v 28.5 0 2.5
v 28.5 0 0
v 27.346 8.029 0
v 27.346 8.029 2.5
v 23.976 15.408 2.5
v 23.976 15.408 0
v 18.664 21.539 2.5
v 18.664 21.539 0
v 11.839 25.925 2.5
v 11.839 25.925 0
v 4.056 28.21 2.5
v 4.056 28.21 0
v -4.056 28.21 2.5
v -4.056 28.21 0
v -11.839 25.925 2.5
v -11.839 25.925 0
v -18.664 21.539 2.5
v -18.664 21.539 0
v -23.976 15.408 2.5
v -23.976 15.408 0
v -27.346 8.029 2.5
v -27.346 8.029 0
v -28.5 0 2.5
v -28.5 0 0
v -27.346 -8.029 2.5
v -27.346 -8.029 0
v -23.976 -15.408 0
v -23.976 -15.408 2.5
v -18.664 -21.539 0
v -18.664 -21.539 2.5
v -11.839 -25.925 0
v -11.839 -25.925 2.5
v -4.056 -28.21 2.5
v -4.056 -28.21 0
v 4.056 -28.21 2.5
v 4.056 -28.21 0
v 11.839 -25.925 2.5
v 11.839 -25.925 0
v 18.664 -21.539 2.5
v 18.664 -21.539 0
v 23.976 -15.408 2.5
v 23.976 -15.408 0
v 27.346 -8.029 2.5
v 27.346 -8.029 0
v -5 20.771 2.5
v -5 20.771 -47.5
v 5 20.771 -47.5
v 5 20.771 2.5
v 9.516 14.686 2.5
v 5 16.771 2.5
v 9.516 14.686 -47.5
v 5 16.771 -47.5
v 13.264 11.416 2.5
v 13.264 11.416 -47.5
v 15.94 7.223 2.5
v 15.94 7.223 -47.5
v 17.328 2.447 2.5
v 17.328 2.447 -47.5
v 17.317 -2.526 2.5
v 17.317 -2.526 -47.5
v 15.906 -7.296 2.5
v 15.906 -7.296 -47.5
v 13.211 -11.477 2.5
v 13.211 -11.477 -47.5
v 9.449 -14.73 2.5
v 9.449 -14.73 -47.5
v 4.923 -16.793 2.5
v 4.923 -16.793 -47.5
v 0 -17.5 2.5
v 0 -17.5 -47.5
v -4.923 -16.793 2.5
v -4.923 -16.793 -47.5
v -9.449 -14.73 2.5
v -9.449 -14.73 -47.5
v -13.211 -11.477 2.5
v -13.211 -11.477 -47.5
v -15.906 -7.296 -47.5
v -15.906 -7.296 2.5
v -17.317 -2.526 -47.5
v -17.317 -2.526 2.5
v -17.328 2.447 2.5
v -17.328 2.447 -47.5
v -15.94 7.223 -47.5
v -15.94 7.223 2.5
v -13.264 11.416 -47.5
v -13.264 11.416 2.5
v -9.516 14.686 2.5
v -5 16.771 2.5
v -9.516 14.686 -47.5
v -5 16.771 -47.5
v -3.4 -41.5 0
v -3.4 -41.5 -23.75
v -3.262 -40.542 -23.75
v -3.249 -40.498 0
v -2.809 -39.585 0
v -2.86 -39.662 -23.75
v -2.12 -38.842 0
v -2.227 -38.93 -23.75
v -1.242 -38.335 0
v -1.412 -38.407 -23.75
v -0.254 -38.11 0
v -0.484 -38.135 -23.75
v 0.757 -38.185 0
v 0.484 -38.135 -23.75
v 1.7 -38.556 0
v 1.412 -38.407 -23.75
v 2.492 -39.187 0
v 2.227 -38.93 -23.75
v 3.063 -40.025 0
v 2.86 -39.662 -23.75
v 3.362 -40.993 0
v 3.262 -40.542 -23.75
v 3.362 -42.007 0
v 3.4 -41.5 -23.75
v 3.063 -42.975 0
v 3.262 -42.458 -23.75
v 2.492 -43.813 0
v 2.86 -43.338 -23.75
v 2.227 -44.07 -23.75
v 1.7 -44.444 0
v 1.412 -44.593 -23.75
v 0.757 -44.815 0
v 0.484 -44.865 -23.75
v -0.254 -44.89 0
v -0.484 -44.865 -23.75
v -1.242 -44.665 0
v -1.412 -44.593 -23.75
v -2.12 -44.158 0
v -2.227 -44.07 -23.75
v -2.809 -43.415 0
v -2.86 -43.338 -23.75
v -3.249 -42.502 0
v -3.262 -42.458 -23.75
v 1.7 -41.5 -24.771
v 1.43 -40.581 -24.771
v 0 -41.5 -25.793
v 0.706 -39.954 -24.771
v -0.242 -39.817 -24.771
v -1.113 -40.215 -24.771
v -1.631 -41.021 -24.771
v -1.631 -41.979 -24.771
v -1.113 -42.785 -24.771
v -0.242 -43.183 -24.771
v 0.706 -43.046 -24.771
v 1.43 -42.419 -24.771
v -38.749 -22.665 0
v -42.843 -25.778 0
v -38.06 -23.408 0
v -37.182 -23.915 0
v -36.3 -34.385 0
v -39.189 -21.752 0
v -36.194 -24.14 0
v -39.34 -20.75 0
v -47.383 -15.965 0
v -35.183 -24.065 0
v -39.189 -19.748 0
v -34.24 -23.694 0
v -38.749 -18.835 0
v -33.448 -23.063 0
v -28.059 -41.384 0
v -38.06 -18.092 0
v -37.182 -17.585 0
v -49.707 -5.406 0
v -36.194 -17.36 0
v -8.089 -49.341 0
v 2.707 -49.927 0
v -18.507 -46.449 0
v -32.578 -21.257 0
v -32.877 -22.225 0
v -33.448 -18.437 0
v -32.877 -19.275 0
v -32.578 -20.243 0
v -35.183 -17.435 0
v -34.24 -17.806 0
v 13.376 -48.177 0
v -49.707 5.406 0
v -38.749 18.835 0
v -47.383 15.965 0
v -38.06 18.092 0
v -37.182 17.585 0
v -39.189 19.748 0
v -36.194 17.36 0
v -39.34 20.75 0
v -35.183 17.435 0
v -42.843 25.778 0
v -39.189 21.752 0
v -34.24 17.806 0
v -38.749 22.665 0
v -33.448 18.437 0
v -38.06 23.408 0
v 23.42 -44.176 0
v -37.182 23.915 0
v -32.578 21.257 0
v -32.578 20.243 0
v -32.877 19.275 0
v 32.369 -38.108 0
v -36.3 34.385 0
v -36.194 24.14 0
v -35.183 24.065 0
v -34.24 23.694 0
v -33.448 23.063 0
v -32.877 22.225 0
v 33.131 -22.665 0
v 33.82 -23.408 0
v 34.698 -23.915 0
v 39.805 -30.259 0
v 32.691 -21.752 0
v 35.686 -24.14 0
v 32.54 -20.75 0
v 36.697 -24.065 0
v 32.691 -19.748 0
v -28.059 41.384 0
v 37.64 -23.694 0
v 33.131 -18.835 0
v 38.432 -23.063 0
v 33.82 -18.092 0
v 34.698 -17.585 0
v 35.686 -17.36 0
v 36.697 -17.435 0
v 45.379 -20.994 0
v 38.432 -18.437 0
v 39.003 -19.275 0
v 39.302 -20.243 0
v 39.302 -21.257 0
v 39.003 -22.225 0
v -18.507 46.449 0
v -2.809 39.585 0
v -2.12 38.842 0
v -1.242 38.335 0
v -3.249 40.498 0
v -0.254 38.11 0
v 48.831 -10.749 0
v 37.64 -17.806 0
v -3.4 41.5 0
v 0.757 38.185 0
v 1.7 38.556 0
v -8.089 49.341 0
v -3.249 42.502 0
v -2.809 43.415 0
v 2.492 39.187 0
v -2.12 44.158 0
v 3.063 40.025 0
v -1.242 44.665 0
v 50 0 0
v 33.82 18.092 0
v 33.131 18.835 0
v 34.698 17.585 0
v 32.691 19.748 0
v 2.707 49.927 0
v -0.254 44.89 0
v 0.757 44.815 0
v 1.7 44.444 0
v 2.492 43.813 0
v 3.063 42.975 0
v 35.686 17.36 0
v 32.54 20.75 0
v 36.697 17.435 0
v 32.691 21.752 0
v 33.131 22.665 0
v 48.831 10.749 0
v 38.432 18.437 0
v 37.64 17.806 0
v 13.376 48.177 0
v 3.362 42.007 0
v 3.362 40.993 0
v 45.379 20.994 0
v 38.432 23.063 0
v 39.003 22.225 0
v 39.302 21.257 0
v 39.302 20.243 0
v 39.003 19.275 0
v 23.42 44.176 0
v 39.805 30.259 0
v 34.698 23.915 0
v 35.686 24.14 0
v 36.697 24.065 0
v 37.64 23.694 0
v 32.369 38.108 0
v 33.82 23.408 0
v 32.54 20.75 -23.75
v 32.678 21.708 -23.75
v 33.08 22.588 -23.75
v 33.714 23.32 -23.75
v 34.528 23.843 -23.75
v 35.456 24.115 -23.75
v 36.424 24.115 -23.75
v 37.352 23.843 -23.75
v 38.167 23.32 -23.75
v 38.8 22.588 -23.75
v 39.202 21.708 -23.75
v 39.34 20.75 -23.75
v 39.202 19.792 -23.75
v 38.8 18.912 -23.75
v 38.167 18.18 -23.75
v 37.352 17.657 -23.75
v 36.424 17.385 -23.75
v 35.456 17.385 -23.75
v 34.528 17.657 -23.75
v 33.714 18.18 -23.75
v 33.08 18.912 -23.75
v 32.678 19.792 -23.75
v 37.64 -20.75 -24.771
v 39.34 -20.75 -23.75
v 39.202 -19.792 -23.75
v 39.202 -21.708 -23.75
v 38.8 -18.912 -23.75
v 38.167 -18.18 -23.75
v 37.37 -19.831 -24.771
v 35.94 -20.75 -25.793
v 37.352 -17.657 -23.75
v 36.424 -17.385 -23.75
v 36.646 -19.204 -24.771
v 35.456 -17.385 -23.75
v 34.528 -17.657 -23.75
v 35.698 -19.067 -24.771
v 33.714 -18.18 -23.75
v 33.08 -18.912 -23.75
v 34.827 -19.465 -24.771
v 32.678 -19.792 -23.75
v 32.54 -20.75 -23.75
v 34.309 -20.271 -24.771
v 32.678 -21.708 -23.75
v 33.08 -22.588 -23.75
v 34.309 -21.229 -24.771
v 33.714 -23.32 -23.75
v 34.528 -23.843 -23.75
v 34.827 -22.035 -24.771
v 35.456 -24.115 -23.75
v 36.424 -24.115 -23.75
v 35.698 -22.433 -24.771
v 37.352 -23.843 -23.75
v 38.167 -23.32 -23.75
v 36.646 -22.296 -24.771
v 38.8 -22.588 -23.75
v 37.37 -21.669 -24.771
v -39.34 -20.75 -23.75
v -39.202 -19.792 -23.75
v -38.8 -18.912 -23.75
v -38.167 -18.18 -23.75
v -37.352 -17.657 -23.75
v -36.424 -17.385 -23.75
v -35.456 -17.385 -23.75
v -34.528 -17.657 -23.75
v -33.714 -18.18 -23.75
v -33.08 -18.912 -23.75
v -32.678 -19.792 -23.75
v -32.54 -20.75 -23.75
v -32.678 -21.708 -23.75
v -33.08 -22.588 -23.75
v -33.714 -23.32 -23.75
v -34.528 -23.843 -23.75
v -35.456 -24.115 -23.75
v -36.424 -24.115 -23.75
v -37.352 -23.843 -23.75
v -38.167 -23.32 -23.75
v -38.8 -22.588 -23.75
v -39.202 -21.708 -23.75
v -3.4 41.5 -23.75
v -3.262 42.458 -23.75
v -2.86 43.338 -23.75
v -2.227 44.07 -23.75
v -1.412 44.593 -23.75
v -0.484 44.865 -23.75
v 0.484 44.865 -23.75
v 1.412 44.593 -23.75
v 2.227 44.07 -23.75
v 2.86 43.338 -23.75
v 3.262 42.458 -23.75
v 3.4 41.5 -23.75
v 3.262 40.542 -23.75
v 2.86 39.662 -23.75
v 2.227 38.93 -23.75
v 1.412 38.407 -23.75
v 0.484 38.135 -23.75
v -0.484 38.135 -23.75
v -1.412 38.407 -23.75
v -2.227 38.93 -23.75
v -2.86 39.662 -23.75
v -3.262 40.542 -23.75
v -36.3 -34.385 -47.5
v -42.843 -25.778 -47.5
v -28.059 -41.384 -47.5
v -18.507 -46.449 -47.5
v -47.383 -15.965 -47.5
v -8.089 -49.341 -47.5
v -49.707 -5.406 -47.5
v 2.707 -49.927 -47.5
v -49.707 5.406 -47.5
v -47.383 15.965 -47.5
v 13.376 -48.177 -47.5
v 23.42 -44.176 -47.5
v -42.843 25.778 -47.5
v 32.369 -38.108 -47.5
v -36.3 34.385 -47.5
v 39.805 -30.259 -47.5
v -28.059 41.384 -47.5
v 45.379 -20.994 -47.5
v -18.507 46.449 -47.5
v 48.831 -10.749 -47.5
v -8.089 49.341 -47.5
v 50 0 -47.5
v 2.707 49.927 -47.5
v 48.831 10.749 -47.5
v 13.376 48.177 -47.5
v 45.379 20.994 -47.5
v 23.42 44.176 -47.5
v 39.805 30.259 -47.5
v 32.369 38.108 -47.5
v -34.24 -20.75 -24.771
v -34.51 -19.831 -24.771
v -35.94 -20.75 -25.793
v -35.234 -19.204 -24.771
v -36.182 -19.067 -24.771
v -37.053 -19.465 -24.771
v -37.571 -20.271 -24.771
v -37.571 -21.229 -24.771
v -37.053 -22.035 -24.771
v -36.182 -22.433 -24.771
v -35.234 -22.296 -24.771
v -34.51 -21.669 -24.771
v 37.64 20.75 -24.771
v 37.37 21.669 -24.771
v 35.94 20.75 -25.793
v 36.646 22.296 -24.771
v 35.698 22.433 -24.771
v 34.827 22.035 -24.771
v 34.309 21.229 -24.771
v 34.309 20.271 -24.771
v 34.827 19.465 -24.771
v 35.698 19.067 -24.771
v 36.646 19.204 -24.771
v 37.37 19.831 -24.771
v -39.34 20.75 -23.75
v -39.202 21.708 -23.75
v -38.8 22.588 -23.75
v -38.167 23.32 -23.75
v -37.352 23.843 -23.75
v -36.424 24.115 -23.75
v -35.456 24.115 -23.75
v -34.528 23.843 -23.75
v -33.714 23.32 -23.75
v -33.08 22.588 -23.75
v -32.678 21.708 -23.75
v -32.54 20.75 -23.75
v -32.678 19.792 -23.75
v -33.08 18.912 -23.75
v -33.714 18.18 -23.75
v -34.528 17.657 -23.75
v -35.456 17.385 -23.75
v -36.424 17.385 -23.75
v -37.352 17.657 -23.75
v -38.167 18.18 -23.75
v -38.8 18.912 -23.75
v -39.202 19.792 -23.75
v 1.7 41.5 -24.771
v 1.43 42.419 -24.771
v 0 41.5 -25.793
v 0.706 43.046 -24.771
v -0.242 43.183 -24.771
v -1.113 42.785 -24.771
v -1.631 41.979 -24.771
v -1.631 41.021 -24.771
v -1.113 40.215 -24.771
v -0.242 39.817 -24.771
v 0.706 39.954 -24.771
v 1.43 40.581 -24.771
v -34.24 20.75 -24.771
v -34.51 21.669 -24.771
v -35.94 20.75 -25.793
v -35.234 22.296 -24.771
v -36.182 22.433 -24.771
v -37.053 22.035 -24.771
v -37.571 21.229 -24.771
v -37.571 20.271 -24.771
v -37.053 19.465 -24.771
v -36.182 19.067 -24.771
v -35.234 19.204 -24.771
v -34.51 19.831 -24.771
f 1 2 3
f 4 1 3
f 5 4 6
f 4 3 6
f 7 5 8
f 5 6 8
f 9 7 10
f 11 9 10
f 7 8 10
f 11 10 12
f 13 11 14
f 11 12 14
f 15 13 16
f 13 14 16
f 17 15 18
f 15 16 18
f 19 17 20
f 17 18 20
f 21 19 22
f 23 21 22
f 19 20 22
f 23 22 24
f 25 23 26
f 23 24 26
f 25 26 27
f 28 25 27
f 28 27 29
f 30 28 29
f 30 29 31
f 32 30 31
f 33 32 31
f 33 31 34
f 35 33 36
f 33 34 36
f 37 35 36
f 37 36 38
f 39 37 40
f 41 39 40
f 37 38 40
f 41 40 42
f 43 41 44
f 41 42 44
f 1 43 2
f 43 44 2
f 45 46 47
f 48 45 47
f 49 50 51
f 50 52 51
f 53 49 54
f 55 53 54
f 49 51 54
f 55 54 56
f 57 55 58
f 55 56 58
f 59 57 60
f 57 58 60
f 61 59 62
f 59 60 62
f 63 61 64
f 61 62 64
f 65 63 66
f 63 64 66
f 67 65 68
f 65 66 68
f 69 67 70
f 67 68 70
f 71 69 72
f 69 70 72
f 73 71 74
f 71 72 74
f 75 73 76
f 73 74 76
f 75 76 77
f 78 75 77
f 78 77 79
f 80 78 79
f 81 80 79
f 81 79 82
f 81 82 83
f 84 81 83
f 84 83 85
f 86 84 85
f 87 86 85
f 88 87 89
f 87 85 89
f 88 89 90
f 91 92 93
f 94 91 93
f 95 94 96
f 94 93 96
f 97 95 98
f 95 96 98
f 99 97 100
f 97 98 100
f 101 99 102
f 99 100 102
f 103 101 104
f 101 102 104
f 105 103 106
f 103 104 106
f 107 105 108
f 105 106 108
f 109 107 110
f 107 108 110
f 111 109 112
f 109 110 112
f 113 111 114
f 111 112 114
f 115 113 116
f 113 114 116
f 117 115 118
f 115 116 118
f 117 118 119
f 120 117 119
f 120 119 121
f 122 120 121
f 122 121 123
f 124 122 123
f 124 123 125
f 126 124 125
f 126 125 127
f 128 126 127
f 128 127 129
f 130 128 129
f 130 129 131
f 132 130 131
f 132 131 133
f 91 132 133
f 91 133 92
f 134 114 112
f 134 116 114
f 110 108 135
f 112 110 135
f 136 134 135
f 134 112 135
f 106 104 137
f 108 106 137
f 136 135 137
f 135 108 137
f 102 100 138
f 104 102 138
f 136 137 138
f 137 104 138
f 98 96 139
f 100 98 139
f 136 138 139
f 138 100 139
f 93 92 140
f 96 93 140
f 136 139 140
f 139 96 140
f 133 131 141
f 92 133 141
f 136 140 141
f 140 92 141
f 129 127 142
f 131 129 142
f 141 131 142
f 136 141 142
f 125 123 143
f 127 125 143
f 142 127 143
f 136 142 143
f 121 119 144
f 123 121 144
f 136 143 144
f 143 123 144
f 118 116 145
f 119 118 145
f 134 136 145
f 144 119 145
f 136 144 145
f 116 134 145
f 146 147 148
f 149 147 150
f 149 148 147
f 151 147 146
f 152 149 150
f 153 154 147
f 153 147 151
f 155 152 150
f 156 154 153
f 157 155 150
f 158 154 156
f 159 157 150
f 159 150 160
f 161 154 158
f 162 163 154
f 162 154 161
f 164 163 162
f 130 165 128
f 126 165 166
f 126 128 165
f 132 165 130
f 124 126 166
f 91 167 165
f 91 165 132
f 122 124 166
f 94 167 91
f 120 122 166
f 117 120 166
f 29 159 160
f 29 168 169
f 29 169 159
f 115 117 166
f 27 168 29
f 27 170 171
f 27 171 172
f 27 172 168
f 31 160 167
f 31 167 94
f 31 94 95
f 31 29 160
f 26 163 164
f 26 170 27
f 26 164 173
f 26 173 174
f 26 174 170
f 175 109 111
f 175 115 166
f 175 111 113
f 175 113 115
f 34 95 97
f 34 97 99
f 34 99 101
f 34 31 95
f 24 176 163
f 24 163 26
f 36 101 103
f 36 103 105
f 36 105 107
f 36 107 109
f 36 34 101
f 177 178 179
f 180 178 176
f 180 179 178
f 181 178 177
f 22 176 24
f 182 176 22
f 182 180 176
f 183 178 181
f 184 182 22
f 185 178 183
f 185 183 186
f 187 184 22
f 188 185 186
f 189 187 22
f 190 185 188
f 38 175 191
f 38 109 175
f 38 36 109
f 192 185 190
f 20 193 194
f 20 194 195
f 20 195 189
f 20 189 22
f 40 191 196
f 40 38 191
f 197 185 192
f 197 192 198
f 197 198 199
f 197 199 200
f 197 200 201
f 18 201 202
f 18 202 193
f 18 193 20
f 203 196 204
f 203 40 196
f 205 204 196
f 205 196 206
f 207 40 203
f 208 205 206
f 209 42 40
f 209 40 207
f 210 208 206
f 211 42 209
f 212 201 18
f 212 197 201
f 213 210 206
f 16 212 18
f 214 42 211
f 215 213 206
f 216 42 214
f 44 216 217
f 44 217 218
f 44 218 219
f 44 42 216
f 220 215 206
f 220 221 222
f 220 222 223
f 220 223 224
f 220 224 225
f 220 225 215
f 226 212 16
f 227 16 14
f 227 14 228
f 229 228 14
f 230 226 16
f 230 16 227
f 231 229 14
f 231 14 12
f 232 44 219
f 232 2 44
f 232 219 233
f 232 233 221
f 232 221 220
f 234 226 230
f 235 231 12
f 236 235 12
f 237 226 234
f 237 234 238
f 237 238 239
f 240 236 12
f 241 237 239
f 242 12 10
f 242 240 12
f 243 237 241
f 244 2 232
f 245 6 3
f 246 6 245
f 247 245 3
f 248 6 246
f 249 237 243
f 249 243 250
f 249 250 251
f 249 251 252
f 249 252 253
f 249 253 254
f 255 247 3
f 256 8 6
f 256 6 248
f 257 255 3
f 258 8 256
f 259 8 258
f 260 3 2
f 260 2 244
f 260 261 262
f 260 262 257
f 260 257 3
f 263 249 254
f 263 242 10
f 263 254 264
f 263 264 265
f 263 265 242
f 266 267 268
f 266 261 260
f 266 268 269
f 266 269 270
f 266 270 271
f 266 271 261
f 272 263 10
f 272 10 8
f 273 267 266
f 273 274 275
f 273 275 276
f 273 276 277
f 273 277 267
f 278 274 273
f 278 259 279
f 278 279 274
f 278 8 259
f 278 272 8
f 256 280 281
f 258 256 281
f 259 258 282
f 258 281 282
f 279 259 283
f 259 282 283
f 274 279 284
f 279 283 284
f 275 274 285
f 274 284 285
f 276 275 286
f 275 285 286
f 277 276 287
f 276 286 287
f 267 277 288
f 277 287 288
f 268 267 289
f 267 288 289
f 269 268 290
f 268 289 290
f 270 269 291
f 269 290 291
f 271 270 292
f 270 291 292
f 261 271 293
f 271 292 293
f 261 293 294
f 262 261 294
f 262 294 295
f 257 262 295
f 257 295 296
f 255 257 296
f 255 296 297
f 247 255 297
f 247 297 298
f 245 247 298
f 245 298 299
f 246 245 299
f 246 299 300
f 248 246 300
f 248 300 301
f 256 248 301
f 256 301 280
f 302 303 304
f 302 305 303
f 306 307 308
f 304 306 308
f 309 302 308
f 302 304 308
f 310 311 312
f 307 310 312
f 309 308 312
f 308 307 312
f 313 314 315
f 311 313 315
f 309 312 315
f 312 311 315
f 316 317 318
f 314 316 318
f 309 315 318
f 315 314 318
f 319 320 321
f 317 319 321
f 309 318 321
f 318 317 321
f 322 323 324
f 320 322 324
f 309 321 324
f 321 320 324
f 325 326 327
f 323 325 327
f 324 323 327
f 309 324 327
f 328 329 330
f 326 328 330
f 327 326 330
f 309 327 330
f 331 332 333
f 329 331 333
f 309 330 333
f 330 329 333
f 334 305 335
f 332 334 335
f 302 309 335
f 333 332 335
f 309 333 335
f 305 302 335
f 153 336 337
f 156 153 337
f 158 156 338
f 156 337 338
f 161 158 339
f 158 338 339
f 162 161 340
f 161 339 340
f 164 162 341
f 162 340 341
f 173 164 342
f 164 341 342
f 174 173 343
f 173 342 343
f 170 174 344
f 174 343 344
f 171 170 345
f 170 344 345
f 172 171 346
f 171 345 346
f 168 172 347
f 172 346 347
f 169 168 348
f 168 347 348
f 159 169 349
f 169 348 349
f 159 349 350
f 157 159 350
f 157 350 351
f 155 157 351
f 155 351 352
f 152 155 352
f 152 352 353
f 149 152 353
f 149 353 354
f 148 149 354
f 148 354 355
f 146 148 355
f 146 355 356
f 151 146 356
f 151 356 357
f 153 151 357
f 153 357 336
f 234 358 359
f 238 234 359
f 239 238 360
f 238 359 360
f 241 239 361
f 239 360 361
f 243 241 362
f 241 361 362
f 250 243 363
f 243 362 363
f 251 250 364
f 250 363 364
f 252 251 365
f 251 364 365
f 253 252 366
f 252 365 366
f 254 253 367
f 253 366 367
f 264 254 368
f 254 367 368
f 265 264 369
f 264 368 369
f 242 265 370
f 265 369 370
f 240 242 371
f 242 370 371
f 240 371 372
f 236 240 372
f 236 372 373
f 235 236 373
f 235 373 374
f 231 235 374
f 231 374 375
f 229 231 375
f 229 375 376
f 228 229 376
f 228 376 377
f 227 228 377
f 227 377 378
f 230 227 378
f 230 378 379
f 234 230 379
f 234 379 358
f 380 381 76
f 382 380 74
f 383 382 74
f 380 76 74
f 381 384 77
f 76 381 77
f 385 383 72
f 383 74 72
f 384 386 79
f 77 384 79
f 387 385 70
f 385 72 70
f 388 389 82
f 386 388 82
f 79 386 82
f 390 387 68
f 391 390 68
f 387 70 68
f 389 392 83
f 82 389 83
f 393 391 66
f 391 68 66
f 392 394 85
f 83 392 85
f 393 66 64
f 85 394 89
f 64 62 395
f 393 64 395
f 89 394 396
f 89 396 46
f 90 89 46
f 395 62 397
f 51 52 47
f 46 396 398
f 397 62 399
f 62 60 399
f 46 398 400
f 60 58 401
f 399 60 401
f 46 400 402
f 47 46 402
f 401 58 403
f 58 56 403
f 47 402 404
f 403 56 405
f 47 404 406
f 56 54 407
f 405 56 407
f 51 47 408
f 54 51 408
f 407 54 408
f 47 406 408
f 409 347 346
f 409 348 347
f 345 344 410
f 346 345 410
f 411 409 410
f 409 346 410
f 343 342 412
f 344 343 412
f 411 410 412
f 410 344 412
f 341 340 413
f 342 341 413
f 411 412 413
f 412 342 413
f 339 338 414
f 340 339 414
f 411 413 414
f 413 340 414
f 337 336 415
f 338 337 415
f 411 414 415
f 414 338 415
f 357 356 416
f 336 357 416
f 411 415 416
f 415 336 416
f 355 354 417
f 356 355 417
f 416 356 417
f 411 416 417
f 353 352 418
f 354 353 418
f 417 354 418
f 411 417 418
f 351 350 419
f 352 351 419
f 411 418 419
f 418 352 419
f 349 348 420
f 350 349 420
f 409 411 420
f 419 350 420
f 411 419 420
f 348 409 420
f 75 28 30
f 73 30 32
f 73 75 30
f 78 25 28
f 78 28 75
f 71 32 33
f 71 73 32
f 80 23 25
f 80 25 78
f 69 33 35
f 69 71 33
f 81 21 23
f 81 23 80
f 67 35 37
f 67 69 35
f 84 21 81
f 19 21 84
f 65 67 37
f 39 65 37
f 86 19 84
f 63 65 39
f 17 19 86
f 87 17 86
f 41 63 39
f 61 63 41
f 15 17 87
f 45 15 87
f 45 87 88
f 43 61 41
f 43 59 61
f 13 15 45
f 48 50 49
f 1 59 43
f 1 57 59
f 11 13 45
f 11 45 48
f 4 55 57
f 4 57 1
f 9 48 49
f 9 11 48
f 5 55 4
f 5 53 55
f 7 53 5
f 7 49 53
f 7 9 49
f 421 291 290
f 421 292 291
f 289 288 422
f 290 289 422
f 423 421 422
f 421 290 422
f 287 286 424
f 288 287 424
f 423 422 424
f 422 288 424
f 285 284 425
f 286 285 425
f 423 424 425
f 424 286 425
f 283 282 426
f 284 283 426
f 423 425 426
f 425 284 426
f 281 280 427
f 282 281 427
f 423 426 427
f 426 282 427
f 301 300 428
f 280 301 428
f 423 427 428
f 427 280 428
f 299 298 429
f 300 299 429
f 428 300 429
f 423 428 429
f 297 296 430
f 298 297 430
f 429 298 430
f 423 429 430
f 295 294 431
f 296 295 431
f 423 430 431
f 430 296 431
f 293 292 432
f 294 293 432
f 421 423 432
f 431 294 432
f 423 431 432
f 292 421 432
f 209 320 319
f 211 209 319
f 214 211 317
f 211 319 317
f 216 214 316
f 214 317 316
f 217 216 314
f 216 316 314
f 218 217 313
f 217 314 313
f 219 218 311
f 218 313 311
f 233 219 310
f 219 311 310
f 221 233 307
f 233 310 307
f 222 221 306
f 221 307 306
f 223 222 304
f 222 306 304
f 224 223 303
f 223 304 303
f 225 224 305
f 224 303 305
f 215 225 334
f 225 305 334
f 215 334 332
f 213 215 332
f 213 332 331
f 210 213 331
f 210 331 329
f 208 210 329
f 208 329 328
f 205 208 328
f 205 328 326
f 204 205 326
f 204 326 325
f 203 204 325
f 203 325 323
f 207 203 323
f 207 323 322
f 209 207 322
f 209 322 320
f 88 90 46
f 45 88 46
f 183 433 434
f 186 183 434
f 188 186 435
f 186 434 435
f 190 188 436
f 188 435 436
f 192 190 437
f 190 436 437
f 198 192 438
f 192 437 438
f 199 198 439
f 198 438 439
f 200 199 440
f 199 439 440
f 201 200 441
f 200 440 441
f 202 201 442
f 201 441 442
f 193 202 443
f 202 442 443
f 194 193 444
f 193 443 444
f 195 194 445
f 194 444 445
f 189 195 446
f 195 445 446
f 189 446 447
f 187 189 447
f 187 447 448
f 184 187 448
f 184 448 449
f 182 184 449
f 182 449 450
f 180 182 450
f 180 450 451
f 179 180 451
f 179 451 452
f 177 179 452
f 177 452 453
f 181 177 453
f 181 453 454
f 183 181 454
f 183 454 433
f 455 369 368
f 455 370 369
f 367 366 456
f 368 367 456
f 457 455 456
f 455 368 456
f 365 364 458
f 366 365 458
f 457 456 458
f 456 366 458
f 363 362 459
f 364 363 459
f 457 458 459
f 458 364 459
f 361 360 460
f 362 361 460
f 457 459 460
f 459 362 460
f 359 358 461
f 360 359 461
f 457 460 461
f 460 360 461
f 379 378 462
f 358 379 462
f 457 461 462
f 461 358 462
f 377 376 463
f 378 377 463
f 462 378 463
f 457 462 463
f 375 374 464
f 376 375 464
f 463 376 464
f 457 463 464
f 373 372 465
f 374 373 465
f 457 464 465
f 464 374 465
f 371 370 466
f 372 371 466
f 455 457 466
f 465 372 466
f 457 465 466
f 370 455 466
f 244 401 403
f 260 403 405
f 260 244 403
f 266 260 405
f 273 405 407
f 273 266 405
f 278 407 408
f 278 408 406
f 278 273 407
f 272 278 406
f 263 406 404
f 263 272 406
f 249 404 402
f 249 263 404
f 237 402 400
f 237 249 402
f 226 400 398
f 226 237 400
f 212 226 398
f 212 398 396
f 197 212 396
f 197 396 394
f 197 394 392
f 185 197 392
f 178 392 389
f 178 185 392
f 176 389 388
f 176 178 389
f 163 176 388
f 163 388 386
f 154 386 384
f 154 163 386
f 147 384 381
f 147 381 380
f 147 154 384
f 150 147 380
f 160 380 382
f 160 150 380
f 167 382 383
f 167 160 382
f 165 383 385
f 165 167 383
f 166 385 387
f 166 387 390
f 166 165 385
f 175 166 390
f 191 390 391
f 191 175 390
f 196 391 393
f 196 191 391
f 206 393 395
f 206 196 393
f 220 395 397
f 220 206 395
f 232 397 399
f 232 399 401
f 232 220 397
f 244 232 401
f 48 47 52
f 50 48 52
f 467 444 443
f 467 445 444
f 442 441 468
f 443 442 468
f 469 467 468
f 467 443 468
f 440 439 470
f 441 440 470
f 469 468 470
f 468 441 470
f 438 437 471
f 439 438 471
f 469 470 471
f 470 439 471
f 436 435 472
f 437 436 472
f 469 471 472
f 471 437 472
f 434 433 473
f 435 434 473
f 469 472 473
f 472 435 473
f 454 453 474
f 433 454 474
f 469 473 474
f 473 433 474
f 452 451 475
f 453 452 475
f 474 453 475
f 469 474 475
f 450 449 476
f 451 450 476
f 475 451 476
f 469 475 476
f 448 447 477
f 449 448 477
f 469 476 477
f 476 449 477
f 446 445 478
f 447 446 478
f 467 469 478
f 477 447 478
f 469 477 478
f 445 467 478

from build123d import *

# Parameters (mm, degrees)
F0_R           = 50
F0_R_2         = 28.5
F1_DEPTH       = 47.5
F2_DEPTH       = 47.5
F3_D           = 6.8
F3_DEPTH       = 23.75
F3_CBORE_D     = 6.8
F3_CBORE_DEPTH = 1
F3_TIP         = 2.0429261047
F4_DEPTH       = 2.5


with BuildPart() as f1:
    # F0 (on Top) → F1 (new body)
    with BuildSketch(Plane.XY):
        Circle(F0_R)
        with BuildLine():
            ThreePointArc((37.7707857076, 17.193537944), (40.5569821786, 8.7966582614), (41.5, 0))
            ThreePointArc((41.5, 0), (40.5569821786, -8.7966582614), (37.7707857076, -17.193537944))
            ThreePointArc((37.7707857076, -17.193537944), (39.3549426741, -18.6670844715), (39.9400542571, -20.75))
            ThreePointArc((39.9400542571, -20.75), (37.8559766131, -24.2613019702), (33.7754334942, -24.1136909717))
            ThreePointArc((33.7754334942, -24.1136909717), (20.75, -35.9400542571), (3.9953522134, -41.3072289157))
            ThreePointArc((3.9953522134, -41.3072289157), (3.9988378845, -41.4035864469), (4, -41.5))
            ThreePointArc((4, -41.5), (-0.0964135531, -45.4988378845), (-3.9953522134, -41.3072289157))
            ThreePointArc((-3.9953522134, -41.3072289157), (-20.75, -35.9400542571), (-33.7754334942, -24.1136909717))
            ThreePointArc((-33.7754334942, -24.1136909717), (-39.4041558722, -22.75), (-37.7707857076, -17.193537944))
            ThreePointArc((-37.7707857076, -17.193537944), (-41.5, 0), (-37.7707857076, 17.193537944))
            ThreePointArc((-37.7707857076, 17.193537944), (-39.4041558722, 22.75), (-33.7754334942, 24.1136909717))
            ThreePointArc((-33.7754334942, 24.1136909717), (-20.75, 35.9400542571), (-3.9953522134, 41.3072289157))
            ThreePointArc((-3.9953522134, 41.3072289157), (-0.0964135531, 45.4988378845), (4, 41.5))
            ThreePointArc((4, 41.5), (3.9988378845, 41.4035864469), (3.9953522134, 41.3072289157))
            ThreePointArc((3.9953522134, 41.3072289157), (20.75, 35.9400542571), (33.7754334942, 24.1136909717))
            ThreePointArc((33.7754334942, 24.1136909717), (37.8559766131, 24.2613019702), (39.9400542571, 20.75))
            ThreePointArc((39.9400542571, 20.75), (39.3549426741, 18.6670844715), (37.7707857076, 17.193537944))
        make_face(mode=Mode.SUBTRACT)
        with BuildLine():
            ThreePointArc((37.7707857076, -17.193537944), (40.5569821786, -8.7966582614), (41.5, 0))
            ThreePointArc((41.5, 0), (40.5569821786, 8.7966582614), (37.7707857076, 17.193537944))
            ThreePointArc((37.7707857076, 17.193537944), (32.4759526419, 18.75), (33.7754334942, 24.1136909717))
            ThreePointArc((33.7754334942, 24.1136909717), (20.75, 35.9400542571), (3.9953522134, 41.3072289157))
            ThreePointArc((3.9953522134, 41.3072289157), (0, 37.5), (-3.9953522134, 41.3072289157))
            ThreePointArc((-3.9953522134, 41.3072289157), (-20.75, 35.9400542571), (-33.7754334942, 24.1136909717))
            ThreePointArc((-33.7754334942, 24.1136909717), (-32.4287522869, 22.665922356), (-31.9400542571, 20.75))
            ThreePointArc((-31.9400542571, 20.75), (-33.8571387285, 17.3351115829), (-37.7707857076, 17.193537944))
            ThreePointArc((-37.7707857076, 17.193537944), (-41.5, 0), (-37.7707857076, -17.193537944))
            ThreePointArc((-37.7707857076, -17.193537944), (-33.8571387285, -17.3351115829), (-31.9400542571, -20.75))
            ThreePointArc((-31.9400542571, -20.75), (-32.4287522869, -22.665922356), (-33.7754334942, -24.1136909717))
            ThreePointArc((-33.7754334942, -24.1136909717), (-20.75, -35.9400542571), (-3.9953522134, -41.3072289157))
            ThreePointArc((-3.9953522134, -41.3072289157), (0, -37.5), (3.9953522134, -41.3072289157))
            ThreePointArc((3.9953522134, -41.3072289157), (20.75, -35.9400542571), (33.7754334942, -24.1136909717))
            ThreePointArc((33.7754334942, -24.1136909717), (32.4759526419, -18.75), (37.7707857076, -17.193537944))
        make_face()
        Circle(F0_R_2, mode=Mode.SUBTRACT)
        with BuildLine():
            ThreePointArc((-37.7707857076, 17.193537944), (-35.9400542571, 20.75), (-33.7754334942, 24.1136909717))
            ThreePointArc((-33.7754334942, 24.1136909717), (-39.4041558722, 22.75), (-37.7707857076, 17.193537944))
        make_face()
        with BuildLine():
            ThreePointArc((-37.7707857076, -17.193537944), (-39.4041558722, -22.75), (-33.7754334942, -24.1136909717))
            ThreePointArc((-33.7754334942, -24.1136909717), (-35.9400542571, -20.75), (-37.7707857076, -17.193537944))
        make_face()
        with BuildLine():
            ThreePointArc((4, -41.5), (3.9988378845, -41.4035864469), (3.9953522134, -41.3072289157))
            ThreePointArc((3.9953522134, -41.3072289157), (0, -41.5), (-3.9953522134, -41.3072289157))
            ThreePointArc((-3.9953522134, -41.3072289157), (-0.0964135531, -45.4988378845), (4, -41.5))
        make_face()
        with BuildLine():
            ThreePointArc((39.9400542571, -20.75), (39.3549426741, -18.6670844715), (37.7707857076, -17.193537944))
            ThreePointArc((37.7707857076, -17.193537944), (35.9400542571, -20.75), (33.7754334942, -24.1136909717))
            ThreePointArc((33.7754334942, -24.1136909717), (37.8559766131, -24.2613019702), (39.9400542571, -20.75))
        make_face()
        with BuildLine():
            ThreePointArc((33.7754334942, 24.1136909717), (35.9400542571, 20.75), (37.7707857076, 17.193537944))
            ThreePointArc((37.7707857076, 17.193537944), (39.3549426741, 18.6670844715), (39.9400542571, 20.75))
            ThreePointArc((39.9400542571, 20.75), (37.8559766131, 24.2613019702), (33.7754334942, 24.1136909717))
        make_face()
        with BuildLine():
            ThreePointArc((-3.9953522134, 41.3072289157), (0, 41.5), (3.9953522134, 41.3072289157))
            ThreePointArc((3.9953522134, 41.3072289157), (3.9988378845, 41.4035864469), (4, 41.5))
            ThreePointArc((4, 41.5), (-0.0964135531, 45.4988378845), (-3.9953522134, 41.3072289157))
        make_face()
        with BuildLine():
            ThreePointArc((-31.9400542571, 20.75), (-32.4287522869, 22.665922356), (-33.7754334942, 24.1136909717))
            ThreePointArc((-33.7754334942, 24.1136909717), (-35.9400542571, 20.75), (-37.7707857076, 17.193537944))
            ThreePointArc((-37.7707857076, 17.193537944), (-33.8571387285, 17.3351115829), (-31.9400542571, 20.75))
        make_face()
        with BuildLine():
            ThreePointArc((-37.7707857076, -17.193537944), (-35.9400542571, -20.75), (-33.7754334942, -24.1136909717))
            ThreePointArc((-33.7754334942, -24.1136909717), (-32.4287522869, -22.665922356), (-31.9400542571, -20.75))
            ThreePointArc((-31.9400542571, -20.75), (-33.8571387285, -17.3351115829), (-37.7707857076, -17.193537944))
        make_face()
        with BuildLine():
            ThreePointArc((-3.9953522134, -41.3072289157), (0, -41.5), (3.9953522134, -41.3072289157))
            ThreePointArc((3.9953522134, -41.3072289157), (0, -37.5), (-3.9953522134, -41.3072289157))
        make_face()
        with BuildLine():
            ThreePointArc((33.7754334942, -24.1136909717), (35.9400542571, -20.75), (37.7707857076, -17.193537944))
            ThreePointArc((37.7707857076, -17.193537944), (32.4759526419, -18.75), (33.7754334942, -24.1136909717))
        make_face()
        with BuildLine():
            ThreePointArc((33.7754334942, 24.1136909717), (32.4759526419, 18.75), (37.7707857076, 17.193537944))
            ThreePointArc((37.7707857076, 17.193537944), (35.9400542571, 20.75), (33.7754334942, 24.1136909717))
        make_face()
        with BuildLine():
            ThreePointArc((-3.9953522134, 41.3072289157), (0, 37.5), (3.9953522134, 41.3072289157))
            ThreePointArc((3.9953522134, 41.3072289157), (0, 41.5), (-3.9953522134, 41.3072289157))
        make_face()
    extrude(amount=-F1_DEPTH)

    # F0 (on Top) → F2 (join)
    with BuildSketch(Plane.XY):
        Circle(F0_R_2)
        with BuildLine():
            ThreePointArc((5, 16.7705098312), (0, -17.5), (-5, 16.7705098312))
            Line((-5, 16.7705098312), (-5, 20.7705098312))
            Line((-5, 20.7705098312), (5, 20.7705098312))
            Line((5, 20.7705098312), (5, 16.7705098312))
        make_face(mode=Mode.SUBTRACT)
    extrude(amount=-F2_DEPTH)

    # F3
    with Locations(Plane.XY):
        with Locations((35.9400542571, -20.75), (35.9400542571, 20.75), (0, 41.5), (-35.9400542571, 20.75), (-35.9400542571, -20.75), (0, -41.5)):
            CounterBoreHole(F3_D / 2, F3_CBORE_D / 2, F3_CBORE_DEPTH, depth=F3_DEPTH)
            with Locations((0, 0, -(F3_DEPTH + F3_TIP / 2))):  # 118° drill point
                Cone(0, F3_D / 2, F3_TIP, mode=Mode.SUBTRACT)

    # F0 (on Top) → F4 (join)
    with BuildSketch(Plane.XY):
        Circle(F0_R_2)
        with BuildLine():
            ThreePointArc((5, 16.7705098312), (0, -17.5), (-5, 16.7705098312))
            Line((-5, 16.7705098312), (-5, 20.7705098312))
            Line((-5, 20.7705098312), (5, 20.7705098312))
            Line((5, 20.7705098312), (5, 16.7705098312))
        make_face(mode=Mode.SUBTRACT)
    extrude(amount=F4_DEPTH)


solid = f1.part
